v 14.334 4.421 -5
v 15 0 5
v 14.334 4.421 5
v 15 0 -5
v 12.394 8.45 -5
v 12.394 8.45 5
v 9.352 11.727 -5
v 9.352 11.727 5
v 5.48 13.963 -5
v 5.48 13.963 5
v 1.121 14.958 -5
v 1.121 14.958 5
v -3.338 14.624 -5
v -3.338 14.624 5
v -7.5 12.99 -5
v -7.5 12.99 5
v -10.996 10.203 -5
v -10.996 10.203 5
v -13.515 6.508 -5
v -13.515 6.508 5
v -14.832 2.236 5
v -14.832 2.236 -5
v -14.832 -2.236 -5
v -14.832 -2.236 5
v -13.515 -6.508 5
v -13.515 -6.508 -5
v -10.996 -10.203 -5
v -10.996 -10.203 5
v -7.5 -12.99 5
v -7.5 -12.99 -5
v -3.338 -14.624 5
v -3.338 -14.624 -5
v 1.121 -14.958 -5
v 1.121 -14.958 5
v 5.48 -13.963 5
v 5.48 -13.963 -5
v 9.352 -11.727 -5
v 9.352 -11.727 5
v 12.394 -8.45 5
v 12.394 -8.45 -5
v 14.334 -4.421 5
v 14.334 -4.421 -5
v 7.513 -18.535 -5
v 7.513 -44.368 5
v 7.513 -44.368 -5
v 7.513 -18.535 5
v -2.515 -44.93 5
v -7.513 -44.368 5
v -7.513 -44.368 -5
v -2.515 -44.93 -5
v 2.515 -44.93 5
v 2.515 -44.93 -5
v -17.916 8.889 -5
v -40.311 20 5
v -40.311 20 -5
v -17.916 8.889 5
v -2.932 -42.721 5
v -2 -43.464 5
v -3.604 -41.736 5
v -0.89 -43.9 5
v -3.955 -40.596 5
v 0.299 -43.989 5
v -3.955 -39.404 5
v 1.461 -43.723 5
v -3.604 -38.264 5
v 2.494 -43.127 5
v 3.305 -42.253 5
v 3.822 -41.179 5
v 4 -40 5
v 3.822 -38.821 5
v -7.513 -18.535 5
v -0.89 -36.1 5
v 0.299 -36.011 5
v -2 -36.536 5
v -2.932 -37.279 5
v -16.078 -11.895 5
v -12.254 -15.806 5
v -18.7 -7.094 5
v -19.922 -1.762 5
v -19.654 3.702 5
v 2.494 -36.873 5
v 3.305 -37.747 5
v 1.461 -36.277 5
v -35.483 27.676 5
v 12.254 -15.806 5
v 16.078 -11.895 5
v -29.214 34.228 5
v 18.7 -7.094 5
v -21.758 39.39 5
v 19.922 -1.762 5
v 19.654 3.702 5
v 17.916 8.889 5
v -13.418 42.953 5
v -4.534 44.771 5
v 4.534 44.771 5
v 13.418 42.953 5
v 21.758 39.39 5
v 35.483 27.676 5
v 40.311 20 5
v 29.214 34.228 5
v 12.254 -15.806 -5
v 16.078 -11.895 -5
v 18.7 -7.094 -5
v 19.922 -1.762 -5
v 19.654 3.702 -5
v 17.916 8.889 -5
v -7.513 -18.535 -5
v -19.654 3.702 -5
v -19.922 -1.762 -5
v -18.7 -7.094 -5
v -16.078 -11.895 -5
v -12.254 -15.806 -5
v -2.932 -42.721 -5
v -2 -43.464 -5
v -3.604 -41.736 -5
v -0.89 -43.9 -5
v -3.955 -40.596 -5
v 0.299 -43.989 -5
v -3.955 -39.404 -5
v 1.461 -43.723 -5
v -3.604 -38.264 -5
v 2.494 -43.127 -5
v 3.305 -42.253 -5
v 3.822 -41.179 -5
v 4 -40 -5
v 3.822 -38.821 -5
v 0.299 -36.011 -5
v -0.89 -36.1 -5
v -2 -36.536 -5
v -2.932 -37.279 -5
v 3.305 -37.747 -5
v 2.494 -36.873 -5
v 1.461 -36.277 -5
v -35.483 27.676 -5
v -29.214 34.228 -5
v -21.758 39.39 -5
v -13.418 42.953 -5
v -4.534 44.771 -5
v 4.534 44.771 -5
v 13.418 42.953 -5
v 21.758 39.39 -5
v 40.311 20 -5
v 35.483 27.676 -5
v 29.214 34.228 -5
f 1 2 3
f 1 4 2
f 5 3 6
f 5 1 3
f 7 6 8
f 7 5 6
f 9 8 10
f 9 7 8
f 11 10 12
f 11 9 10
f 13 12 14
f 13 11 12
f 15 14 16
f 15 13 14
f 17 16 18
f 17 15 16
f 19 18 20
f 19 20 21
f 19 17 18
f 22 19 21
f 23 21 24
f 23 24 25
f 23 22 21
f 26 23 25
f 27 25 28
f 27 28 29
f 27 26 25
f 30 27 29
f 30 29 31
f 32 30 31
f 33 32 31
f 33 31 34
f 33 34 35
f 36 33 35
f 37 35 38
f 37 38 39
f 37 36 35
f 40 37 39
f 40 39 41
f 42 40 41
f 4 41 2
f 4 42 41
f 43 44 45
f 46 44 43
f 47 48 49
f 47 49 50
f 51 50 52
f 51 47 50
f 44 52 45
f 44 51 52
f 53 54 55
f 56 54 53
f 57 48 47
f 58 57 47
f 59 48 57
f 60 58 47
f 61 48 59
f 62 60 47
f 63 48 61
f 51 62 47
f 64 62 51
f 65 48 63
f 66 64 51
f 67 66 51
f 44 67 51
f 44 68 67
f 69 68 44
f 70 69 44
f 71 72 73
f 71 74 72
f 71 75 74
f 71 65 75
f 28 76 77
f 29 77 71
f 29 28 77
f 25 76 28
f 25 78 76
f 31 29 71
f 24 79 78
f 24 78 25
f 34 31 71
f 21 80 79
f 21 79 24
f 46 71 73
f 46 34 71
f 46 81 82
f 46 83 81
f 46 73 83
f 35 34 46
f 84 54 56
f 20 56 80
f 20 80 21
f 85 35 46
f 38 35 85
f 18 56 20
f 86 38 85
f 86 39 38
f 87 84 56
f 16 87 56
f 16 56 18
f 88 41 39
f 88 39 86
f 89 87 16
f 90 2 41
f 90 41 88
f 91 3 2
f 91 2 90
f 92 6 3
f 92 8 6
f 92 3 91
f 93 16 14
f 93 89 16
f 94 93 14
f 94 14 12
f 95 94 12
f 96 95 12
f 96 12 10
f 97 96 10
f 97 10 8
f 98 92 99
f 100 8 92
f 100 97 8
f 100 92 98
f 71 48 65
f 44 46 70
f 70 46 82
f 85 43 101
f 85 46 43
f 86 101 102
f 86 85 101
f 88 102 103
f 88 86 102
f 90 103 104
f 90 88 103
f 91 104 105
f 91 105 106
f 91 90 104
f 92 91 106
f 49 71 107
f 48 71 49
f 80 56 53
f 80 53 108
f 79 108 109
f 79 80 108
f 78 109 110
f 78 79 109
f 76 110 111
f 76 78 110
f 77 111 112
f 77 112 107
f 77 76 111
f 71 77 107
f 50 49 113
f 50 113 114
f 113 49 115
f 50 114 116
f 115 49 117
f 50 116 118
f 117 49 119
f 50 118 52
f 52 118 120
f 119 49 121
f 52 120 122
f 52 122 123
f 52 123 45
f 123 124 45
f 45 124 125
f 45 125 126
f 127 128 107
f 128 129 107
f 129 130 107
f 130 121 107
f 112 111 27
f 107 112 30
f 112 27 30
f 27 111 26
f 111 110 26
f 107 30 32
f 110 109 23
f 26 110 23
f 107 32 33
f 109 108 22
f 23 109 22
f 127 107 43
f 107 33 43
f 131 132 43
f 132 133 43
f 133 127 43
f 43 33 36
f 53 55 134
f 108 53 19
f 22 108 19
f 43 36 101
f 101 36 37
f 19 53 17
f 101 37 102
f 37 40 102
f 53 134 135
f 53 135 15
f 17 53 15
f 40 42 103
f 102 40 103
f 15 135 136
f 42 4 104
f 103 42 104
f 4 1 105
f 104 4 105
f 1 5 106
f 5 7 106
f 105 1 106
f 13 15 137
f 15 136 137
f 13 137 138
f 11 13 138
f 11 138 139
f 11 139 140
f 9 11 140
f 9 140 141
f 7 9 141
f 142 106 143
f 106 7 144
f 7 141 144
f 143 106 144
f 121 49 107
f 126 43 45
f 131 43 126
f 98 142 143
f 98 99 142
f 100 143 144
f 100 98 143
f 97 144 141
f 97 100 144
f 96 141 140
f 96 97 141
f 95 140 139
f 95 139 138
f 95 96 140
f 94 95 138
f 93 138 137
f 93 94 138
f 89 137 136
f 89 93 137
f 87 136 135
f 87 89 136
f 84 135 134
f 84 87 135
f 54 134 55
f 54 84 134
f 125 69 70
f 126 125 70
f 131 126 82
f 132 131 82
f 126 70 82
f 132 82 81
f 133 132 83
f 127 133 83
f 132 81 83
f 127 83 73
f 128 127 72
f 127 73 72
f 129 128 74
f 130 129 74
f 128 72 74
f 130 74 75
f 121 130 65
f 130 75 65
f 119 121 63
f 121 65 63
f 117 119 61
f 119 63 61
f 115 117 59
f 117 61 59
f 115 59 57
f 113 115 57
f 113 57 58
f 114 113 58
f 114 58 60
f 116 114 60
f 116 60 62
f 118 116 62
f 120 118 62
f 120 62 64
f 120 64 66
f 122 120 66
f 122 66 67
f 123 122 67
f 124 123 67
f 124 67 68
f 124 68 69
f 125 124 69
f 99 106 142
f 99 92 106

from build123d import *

# Parameters (mm, degrees)
SKETCH1_R           = 15
BOSS_EXTRUDE1_DEPTH = 5
SKETCH2_R           = 4
CUT_EXTRUDE1_DEPTH  = 62.23724357


with BuildPart() as part:
    # Sketch1 → Boss-Extrude1 (new, symmetric)
    with BuildSketch(Plane.XY):
        with BuildLine():
            Line((-40.311288741, 20), (-17.91612833, 8.888888889))
            ThreePointArc((-17.91612833, 8.888888889), (-18.699713239, -7.093710227), (-7.512794536, -18.535315435))
            Line((-7.512794536, -18.535315435), (-7.512794536, -44.368433804))
            ThreePointArc((-7.512794536, -44.368433804), (0, -45), (7.512794536, -44.368433804))
            Line((7.512794536, -44.368433804), (7.512794536, -18.535315435))
            ThreePointArc((7.512794536, -18.535315435), (18.699713239, -7.093710227), (17.91612833, 8.888888889))
            Line((17.91612833, 8.888888889), (40.311288741, 20))
            ThreePointArc((40.311288741, 20), (0, 45), (-40.311288741, 20))
        make_face()
        Circle(SKETCH1_R, mode=Mode.SUBTRACT)
    extrude(amount=BOSS_EXTRUDE1_DEPTH, both=True)

    # Sketch2 → Cut-Extrude1 (cut, through all)
    with BuildSketch(Plane.XY.offset(5)):
        with Locations((0, -40)):
            Circle(SKETCH2_R)
    extrude(amount=-CUT_EXTRUDE1_DEPTH, mode=Mode.SUBTRACT)


solid = part.part
